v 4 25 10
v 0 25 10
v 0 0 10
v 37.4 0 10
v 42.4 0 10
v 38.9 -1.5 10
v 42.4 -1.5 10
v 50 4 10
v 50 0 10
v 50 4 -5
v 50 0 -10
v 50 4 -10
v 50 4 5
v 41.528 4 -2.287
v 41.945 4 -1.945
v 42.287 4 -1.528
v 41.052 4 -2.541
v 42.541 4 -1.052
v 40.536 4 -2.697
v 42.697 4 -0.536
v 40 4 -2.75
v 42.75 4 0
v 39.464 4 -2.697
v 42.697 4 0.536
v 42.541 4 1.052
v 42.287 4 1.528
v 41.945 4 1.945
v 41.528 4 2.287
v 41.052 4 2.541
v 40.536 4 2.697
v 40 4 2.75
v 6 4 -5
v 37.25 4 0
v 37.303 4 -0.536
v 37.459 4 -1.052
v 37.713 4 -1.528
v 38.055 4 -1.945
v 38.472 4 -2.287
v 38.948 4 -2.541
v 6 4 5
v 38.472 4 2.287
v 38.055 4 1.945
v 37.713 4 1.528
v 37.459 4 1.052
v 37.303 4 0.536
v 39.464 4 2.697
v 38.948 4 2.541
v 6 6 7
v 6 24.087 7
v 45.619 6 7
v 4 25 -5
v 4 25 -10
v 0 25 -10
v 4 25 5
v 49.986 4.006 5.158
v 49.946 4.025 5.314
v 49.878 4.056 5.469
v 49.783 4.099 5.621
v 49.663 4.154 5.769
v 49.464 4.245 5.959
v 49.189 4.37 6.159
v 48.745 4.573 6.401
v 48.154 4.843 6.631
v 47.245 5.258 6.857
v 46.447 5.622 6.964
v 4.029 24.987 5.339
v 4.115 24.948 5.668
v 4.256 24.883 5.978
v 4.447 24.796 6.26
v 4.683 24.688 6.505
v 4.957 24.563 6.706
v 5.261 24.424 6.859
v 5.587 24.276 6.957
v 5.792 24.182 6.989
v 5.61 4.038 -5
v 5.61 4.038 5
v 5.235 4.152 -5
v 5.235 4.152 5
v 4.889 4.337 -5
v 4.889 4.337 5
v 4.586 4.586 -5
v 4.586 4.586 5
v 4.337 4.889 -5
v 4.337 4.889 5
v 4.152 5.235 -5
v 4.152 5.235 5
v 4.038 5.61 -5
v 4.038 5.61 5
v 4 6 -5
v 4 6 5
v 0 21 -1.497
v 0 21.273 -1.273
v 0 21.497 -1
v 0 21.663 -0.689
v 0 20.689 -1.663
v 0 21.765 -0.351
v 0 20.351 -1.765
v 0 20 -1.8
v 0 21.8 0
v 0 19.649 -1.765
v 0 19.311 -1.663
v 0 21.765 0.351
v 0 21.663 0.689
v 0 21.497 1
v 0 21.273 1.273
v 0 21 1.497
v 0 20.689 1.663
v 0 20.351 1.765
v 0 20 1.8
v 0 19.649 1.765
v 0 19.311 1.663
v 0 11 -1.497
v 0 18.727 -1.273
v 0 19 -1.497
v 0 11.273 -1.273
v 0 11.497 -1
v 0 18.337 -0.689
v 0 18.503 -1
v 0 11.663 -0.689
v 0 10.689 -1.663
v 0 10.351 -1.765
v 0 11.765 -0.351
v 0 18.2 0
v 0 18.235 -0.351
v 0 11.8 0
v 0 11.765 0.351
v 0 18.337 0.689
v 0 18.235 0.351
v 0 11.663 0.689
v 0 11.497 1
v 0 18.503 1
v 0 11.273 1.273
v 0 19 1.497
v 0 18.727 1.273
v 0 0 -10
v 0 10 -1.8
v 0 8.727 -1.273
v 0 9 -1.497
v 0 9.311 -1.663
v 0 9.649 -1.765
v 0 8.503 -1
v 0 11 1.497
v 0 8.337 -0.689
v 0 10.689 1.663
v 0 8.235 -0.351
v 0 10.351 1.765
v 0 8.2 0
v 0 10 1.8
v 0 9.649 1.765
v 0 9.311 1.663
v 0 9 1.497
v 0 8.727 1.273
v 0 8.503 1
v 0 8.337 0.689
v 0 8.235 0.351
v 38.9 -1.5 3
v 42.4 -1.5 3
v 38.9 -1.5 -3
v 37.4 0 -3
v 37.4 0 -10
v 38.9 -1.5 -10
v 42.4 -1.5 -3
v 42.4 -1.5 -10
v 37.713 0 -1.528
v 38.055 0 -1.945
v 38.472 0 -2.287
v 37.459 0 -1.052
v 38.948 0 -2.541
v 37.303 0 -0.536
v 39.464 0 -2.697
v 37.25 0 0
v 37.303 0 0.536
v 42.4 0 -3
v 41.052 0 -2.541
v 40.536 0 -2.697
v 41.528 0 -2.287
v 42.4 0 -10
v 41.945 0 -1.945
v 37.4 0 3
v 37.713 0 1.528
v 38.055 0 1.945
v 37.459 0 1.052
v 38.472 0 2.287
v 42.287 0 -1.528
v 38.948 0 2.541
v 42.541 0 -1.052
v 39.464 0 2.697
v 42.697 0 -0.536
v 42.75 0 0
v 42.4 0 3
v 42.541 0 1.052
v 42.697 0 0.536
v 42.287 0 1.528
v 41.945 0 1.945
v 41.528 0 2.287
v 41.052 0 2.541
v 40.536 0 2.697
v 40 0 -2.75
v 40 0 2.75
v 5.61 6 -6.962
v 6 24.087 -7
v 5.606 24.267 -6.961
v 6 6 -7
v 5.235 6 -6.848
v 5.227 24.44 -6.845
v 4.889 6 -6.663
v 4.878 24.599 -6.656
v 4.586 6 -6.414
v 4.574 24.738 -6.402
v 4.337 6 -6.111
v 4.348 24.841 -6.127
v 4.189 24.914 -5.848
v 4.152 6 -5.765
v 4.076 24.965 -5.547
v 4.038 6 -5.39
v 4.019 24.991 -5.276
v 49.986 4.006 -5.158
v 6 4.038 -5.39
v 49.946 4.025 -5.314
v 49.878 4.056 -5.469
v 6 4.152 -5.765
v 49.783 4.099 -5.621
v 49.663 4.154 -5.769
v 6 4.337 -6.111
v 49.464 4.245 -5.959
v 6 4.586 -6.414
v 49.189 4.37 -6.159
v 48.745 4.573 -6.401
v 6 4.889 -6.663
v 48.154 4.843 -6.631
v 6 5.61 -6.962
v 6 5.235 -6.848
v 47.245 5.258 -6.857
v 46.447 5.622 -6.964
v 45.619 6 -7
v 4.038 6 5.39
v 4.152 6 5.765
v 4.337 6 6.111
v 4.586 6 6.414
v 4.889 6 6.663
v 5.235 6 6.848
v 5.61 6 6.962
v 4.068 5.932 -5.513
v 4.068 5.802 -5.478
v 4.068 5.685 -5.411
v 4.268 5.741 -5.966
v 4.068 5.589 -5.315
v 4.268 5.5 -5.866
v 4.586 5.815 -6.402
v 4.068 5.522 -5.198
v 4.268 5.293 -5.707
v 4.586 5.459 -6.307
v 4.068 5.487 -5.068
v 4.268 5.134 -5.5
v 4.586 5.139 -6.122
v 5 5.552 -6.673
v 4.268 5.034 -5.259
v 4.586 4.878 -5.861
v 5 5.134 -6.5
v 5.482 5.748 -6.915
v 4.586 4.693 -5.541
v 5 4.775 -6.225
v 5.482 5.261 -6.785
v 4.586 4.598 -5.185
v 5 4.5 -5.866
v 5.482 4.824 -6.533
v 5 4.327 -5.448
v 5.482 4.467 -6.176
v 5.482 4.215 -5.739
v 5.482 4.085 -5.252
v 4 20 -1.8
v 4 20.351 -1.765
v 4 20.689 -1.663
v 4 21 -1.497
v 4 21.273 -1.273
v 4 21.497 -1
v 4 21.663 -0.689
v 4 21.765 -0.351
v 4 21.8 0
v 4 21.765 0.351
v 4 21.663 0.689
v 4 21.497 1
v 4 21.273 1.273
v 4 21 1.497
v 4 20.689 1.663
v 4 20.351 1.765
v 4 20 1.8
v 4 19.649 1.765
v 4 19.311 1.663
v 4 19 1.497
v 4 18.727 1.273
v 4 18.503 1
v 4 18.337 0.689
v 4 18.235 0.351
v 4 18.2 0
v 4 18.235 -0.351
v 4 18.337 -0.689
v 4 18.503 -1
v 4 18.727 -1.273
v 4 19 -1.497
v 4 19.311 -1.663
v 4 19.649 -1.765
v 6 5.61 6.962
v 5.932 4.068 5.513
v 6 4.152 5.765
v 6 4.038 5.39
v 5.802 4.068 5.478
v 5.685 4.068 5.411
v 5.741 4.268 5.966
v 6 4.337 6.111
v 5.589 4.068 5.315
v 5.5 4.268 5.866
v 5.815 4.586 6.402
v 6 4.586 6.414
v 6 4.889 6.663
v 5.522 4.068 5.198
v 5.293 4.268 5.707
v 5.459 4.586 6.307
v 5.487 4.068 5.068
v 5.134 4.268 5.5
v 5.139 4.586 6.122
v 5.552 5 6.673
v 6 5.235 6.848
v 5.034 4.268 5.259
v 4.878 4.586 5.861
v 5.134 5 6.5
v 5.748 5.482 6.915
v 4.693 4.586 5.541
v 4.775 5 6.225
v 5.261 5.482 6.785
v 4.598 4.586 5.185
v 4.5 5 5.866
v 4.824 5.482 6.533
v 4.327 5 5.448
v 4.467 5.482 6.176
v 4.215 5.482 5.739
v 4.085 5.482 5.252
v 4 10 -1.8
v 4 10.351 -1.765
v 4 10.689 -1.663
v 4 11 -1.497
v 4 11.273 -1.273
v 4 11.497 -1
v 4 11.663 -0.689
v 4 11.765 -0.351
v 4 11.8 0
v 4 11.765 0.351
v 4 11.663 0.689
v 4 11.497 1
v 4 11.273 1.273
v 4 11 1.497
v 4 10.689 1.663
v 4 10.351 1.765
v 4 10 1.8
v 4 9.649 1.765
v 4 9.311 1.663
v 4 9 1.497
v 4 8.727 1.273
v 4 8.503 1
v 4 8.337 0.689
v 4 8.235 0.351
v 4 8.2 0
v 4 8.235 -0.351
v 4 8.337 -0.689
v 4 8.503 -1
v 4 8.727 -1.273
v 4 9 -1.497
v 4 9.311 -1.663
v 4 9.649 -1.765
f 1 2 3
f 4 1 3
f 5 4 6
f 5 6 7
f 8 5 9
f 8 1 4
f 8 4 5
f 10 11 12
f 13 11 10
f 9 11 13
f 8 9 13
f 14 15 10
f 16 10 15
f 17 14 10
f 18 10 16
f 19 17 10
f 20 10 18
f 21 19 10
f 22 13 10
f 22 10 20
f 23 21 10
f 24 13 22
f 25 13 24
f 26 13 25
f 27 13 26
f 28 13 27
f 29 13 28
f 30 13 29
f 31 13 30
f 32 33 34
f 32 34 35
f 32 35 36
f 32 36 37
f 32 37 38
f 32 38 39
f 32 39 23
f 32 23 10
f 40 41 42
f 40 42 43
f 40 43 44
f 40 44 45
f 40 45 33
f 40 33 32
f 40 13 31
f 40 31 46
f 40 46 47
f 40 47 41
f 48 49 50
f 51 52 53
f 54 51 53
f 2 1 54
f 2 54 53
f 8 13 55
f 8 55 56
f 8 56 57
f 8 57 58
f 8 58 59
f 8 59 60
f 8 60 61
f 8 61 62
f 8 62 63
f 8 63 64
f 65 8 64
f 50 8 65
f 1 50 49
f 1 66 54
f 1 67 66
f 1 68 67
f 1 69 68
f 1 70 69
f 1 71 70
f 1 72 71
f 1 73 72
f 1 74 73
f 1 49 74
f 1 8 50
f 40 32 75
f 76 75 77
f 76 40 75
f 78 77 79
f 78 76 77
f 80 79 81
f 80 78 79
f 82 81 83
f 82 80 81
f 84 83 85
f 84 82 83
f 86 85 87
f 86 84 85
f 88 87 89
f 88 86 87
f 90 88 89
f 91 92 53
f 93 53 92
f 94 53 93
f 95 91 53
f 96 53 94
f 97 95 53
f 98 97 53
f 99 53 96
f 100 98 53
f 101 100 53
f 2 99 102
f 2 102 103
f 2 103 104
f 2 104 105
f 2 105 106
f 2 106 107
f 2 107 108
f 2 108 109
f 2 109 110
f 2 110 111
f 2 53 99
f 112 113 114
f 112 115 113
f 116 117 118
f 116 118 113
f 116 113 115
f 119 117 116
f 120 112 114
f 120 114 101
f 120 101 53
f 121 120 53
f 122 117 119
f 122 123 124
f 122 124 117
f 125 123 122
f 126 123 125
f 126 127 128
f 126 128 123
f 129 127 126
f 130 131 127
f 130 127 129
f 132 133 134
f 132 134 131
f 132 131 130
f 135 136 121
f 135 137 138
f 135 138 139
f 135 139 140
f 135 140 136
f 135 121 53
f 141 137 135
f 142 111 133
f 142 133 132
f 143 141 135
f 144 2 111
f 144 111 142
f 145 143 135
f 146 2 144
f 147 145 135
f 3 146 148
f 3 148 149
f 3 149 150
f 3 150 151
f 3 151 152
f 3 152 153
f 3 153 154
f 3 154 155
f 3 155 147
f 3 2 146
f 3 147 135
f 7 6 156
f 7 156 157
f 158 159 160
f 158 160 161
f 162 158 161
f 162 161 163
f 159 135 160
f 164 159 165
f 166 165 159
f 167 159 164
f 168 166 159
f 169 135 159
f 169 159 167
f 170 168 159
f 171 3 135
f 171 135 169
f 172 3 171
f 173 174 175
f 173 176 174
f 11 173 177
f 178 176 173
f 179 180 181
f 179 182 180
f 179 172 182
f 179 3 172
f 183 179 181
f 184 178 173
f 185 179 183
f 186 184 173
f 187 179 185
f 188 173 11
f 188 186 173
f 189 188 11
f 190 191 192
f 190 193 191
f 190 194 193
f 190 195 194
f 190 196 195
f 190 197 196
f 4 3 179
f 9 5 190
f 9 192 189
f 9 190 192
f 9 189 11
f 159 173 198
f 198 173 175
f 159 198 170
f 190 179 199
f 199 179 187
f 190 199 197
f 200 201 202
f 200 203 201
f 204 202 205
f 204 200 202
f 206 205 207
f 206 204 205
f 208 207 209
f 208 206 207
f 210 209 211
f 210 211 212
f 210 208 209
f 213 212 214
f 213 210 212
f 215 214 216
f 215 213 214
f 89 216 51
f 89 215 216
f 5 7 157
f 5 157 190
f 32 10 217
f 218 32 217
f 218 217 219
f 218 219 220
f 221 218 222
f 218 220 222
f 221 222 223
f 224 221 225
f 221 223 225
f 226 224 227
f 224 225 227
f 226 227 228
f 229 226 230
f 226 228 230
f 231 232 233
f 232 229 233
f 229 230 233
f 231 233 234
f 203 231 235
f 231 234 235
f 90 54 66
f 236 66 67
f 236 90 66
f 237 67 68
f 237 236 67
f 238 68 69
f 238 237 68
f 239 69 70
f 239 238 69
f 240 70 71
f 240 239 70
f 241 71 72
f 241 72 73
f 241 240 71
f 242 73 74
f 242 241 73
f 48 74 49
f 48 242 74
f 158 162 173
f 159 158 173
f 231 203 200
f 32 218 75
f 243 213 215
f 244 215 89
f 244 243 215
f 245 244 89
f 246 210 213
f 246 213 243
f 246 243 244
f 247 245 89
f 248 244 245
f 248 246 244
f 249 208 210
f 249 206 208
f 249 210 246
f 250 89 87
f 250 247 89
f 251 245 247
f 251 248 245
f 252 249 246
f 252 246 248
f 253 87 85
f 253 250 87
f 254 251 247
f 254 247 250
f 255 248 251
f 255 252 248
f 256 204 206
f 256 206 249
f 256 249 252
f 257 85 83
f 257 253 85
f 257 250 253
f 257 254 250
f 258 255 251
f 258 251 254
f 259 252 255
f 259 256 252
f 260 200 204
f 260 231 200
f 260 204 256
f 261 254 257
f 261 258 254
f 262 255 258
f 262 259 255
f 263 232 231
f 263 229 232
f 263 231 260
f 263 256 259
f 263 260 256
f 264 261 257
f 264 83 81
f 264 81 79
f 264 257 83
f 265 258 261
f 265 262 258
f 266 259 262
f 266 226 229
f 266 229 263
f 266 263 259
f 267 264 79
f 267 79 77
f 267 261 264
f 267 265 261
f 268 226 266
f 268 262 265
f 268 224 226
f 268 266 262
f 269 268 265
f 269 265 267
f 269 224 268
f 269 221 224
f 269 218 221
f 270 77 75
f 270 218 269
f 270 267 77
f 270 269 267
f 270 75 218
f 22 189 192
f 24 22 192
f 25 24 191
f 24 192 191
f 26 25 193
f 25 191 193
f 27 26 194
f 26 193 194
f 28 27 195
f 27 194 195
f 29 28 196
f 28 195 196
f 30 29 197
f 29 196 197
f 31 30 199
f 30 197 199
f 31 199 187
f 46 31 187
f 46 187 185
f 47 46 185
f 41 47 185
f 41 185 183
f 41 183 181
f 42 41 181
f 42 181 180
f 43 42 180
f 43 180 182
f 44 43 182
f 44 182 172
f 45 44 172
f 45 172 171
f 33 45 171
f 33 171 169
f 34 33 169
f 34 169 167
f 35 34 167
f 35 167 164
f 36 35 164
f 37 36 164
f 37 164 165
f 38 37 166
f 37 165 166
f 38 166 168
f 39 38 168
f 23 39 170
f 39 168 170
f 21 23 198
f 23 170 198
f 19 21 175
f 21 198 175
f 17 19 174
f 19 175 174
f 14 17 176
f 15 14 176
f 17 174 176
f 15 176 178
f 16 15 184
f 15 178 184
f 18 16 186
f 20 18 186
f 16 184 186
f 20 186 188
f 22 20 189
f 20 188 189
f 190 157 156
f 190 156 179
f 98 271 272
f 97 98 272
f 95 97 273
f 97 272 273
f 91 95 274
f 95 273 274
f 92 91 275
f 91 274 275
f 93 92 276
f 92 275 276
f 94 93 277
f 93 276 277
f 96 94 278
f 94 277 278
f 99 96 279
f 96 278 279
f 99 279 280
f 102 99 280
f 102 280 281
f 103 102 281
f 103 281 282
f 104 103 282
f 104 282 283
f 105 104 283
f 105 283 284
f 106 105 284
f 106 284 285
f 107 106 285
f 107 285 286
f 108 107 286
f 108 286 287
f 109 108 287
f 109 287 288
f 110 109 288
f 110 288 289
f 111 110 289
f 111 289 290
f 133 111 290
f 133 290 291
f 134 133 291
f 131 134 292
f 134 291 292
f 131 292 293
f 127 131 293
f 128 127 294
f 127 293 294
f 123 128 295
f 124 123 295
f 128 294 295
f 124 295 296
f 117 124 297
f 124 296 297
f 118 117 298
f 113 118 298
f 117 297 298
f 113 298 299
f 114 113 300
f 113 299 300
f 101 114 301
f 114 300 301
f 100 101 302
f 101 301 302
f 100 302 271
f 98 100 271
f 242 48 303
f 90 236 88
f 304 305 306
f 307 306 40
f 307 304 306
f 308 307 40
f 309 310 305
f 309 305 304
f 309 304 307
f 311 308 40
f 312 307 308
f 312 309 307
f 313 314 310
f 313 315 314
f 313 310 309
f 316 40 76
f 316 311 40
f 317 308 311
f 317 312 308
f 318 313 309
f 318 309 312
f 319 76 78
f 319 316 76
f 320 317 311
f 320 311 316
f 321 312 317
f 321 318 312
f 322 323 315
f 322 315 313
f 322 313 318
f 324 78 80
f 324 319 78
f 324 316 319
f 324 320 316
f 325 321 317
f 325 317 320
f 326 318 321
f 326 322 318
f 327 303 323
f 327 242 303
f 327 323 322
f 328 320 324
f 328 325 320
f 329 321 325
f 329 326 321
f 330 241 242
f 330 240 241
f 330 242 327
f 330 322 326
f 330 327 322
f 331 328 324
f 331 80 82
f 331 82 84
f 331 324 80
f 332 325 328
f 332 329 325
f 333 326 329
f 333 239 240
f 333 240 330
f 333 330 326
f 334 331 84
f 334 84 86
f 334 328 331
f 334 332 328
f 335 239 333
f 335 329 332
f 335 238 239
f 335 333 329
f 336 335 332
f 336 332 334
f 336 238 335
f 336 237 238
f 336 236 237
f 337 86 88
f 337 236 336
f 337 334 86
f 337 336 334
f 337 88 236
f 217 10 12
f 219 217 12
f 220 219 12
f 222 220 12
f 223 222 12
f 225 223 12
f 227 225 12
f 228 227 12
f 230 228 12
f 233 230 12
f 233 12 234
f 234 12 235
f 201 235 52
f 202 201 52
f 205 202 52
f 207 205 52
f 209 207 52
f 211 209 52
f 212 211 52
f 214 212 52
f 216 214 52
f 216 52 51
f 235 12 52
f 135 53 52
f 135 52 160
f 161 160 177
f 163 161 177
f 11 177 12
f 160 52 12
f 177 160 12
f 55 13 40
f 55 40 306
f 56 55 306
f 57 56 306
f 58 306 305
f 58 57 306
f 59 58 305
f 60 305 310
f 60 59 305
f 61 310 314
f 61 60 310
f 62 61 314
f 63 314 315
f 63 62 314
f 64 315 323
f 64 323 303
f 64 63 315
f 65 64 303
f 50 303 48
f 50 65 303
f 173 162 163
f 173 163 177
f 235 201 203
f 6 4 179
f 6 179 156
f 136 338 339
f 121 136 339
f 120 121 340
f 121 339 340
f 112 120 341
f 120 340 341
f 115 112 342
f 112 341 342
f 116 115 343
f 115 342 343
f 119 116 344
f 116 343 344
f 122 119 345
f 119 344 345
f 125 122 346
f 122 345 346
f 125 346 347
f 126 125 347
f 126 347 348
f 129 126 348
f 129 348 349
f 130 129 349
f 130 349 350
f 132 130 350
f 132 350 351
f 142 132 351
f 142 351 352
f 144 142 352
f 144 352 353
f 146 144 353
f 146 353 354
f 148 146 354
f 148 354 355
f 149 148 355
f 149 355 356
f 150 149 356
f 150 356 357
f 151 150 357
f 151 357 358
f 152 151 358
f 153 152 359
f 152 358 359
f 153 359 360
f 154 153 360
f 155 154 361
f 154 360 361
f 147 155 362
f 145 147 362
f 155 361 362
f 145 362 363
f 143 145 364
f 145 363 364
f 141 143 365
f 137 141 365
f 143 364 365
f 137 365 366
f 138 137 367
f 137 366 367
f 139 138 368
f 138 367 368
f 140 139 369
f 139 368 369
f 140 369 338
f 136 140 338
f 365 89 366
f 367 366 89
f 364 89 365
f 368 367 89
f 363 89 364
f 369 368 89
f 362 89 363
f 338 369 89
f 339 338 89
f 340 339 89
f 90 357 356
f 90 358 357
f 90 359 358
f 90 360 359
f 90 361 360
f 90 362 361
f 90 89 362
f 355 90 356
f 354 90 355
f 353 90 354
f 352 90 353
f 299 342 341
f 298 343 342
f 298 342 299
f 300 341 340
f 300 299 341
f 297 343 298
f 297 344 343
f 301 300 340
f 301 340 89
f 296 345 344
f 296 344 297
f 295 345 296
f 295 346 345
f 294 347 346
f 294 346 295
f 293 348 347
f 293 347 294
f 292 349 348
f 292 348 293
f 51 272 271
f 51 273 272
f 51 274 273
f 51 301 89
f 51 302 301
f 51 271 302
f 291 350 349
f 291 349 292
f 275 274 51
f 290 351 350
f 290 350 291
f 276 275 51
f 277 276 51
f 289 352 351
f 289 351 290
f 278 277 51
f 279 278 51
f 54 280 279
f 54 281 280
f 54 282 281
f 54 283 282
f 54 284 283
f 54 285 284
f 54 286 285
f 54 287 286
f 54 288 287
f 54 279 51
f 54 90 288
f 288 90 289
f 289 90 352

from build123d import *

# Parameters (mm, degrees)
SALIENTE_EXTRUIR1_DEPTH = 10
CROQUIS7_W              = 6
CROQUIS7_H              = 1.5
CORTAR_EXTRUIR3_DEPTH   = 51
CROQUIS3_R              = 2.75
CORTAR_EXTRUIR1_DEPTH   = 20
CROQUIS4_R              = 1.8
CORTAR_EXTRUIR2_DEPTH   = 20
SALIENTE_EXTRUIR2_DEPTH = 3
REDONDEO1_R             = 2


with BuildPart() as part:
    # Croquis1 → Saliente-Extruir1 (new body, symmetric)
    with BuildSketch(Plane.XY):
        Polygon((0, 0), (37.4, 0), (38.9, -1.5), (42.4, -1.5), (42.4, 0), (50, 0), (50, 4), (4, 4), (4, 25), (0, 25), align=None)
    extrude(amount=SALIENTE_EXTRUIR1_DEPTH, both=True)

    # Croquis7 → Cortar-Extruir3 (cut, through all)
    with BuildSketch(Plane(origin=(50, 0, 0), x_dir=(0, 0, -1), z_dir=(1, 0, 0))):
        with Locations((0, -0.75)):
            Rectangle(CROQUIS7_W, CROQUIS7_H)
    extrude(amount=-CORTAR_EXTRUIR3_DEPTH, mode=Mode.SUBTRACT)

    # Croquis3 → Cortar-Extruir1 (cut)
    with BuildSketch(Plane.XZ):
        with Locations((40, 0)):
            Circle(CROQUIS3_R)
    extrude(amount=-CORTAR_EXTRUIR1_DEPTH, mode=Mode.SUBTRACT)

    # Croquis4 → Cortar-Extruir2 (cut)
    with BuildSketch(Plane(origin=(4, 0, 0), x_dir=(0, 0, -1), z_dir=(1, 0, 0))):
        with Locations((0, 20)):
            Circle(CROQUIS4_R)
        with Locations((0, 10)):
            Circle(CROQUIS4_R)
    extrude(amount=-CORTAR_EXTRUIR2_DEPTH, mode=Mode.SUBTRACT)

    # Croquis5 → Saliente-Extruir2 (add)
    with BuildSketch(Plane(origin=(0, 0, -10), x_dir=(-1, 0, 0), z_dir=(0, 0, -1))):
        Polygon((0, 0), (-50, 0), (-50, 4), (-4, 25), (0, 25), align=None)
    saliente_extruir2 = extrude(amount=-SALIENTE_EXTRUIR2_DEPTH)

    # Simetría1: Saliente-Extruir2 across plane
    add(saliente_extruir2.mirror(Plane.XY))

    # Redondeo1
    redondeo1_edges = [part.edges().sort_by_distance(p)[0] for p in [
        (4, 14.5, 7),
        (27, 4, 7),
        (27, 4, -7),
        (4, 14.5, -7),
        (4, 4, 0),
    ]]
    fillet(redondeo1_edges, radius=REDONDEO1_R)


solid = part.part
